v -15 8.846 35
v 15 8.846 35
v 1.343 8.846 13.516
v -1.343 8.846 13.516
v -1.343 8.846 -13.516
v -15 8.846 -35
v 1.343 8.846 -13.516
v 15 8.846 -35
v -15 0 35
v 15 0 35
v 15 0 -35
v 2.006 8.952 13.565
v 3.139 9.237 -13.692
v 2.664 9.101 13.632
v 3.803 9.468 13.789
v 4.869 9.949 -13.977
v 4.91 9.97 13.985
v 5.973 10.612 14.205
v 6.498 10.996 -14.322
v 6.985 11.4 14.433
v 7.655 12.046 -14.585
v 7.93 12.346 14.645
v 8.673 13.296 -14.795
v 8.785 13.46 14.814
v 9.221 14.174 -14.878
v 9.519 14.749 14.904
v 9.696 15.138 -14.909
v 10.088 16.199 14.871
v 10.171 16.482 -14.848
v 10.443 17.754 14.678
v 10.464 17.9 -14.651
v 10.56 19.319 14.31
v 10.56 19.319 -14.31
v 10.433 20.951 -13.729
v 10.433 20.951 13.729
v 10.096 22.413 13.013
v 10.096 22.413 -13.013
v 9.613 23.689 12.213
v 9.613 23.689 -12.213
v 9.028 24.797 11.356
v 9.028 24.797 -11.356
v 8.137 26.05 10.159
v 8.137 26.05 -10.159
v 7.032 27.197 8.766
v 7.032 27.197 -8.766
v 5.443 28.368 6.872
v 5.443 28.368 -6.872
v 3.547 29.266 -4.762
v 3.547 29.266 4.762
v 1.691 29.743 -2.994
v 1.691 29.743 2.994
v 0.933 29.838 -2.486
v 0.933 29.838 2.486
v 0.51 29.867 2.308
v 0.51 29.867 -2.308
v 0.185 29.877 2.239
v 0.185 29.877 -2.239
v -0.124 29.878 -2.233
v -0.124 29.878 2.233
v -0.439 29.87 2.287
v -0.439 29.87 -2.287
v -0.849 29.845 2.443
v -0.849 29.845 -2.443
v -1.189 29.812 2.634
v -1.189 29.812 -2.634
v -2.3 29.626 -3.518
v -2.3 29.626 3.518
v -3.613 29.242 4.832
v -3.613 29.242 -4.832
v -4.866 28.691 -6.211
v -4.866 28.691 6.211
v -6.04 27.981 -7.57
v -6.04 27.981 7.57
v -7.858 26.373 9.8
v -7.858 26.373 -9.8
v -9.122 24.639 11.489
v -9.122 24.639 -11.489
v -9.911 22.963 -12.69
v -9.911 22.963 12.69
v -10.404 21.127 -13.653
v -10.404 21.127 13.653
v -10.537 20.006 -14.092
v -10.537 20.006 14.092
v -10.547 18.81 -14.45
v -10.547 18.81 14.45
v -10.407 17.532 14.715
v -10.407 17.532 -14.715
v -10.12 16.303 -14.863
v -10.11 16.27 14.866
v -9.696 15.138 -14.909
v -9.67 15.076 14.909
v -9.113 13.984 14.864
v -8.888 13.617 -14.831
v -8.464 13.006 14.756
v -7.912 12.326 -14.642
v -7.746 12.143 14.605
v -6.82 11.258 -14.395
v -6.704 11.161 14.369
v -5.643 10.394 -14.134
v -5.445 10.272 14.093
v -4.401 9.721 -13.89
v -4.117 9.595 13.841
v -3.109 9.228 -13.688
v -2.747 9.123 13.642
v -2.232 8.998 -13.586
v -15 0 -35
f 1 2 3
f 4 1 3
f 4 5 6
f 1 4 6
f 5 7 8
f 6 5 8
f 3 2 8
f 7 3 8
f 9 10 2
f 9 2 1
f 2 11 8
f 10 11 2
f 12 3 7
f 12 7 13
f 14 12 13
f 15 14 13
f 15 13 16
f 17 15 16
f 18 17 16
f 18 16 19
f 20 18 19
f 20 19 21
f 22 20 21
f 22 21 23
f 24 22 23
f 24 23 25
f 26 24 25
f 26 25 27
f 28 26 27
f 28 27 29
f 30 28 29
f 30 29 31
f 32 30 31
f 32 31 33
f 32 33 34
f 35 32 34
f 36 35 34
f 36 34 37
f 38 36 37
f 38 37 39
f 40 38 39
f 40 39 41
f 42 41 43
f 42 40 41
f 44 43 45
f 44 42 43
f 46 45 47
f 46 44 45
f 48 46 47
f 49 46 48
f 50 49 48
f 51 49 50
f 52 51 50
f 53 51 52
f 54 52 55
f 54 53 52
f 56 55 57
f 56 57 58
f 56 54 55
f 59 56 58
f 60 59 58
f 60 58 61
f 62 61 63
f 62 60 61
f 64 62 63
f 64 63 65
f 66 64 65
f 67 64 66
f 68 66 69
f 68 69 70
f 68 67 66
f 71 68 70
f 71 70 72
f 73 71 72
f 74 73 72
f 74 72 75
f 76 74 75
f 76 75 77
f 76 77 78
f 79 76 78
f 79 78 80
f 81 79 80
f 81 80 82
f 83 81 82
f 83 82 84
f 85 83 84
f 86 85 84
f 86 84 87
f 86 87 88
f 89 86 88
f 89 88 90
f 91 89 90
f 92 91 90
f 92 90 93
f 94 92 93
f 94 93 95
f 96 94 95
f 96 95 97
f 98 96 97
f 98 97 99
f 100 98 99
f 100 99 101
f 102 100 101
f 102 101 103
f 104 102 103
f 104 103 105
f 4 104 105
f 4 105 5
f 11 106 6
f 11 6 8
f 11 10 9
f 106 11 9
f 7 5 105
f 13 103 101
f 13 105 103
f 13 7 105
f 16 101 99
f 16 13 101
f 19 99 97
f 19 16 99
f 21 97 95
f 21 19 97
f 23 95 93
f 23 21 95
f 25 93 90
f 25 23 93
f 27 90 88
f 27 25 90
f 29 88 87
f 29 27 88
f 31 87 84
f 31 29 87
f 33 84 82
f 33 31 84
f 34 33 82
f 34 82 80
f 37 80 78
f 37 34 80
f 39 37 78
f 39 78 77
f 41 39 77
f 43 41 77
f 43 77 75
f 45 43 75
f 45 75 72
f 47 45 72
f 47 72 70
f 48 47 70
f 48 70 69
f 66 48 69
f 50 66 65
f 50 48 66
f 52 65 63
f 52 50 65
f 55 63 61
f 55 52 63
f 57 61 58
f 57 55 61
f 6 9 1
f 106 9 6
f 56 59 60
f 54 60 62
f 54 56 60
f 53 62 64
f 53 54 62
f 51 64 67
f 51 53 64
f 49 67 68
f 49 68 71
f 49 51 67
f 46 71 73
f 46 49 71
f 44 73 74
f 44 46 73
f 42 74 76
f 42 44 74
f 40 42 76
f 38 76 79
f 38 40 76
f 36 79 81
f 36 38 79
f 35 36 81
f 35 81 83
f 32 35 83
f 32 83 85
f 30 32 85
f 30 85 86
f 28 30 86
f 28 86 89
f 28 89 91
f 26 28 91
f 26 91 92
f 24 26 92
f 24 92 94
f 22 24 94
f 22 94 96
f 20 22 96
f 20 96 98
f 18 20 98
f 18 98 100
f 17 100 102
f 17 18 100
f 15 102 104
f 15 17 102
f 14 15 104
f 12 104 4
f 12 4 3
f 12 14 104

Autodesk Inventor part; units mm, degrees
ref_plane "YZ Plane" through (0, 0, 0) normal (1, 0, 0) x (0, 1, 0)
ref_plane "XZ Plane" through (0, 0, 0) normal (0, 1, 0) x (-1, 0, 0)
ref_plane "XY Plane" through (0, 0, 0) normal (0, 0, 1) x (1, 0, 0)
sketch "Sketch1" plane through (0, 0, 0) normal (0, 1, 0) x (-1, 0, 0)
  line L0 (15, -35) -> (-15, -35)
  line L1 (-15, -35) -> (-15, 35)
  line L2 (-15, 35) -> (15, 35)
  line L3 (15, 35) -> (15, -35)
  line L4 (15, -35) -> (-15, 35) construction
  line L5 (-15, -35) -> (15, 35) construction
  point P0 (0, 0)
  dimension "d0" = 30
  dimension "d1" = 70
extrude "Extrusion1" add sketch "Sketch1" along normal blind 30
sketch "Sketch2" plane through (15, 0, 35) normal (1, 0, 0) x (0, 0, -1)
  circle A0 centre (35, 15.1375) radius 14.909
  line L0 (0, 0) -> (0, 30) projected
  line L1 (0, 8.8455) -> (70, 8.8455)
  line L2 (0, 30) -> (70, 30) projected
  line L3 (0, 0) -> (70, 0) projected
  line L4 (70, 0) -> (70, 30) projected
  point P0 (35, 0)
  point P1 (36.1767, 30)
  point P2 (21.4837, 8.8455)
  point P3 (33.8233, 30)
  point P4 (48.5163, 8.8455)
extrude "Extrusion2" cut sketch "Sketch2" against normal blind 30 contours A0 L2 L4 L1 | A0 L1 L0 L2
sketch "Sketch3" plane through (-15, 0, 35) normal (0, 0, 1) x (1, 0, 0)
  circle A0 centre (15, 19.3194) radius 10.5597
  line L0 (0, 30) -> (0, 8.8455) projected
  line L1 (0, 30) -> (30, 30) projected
  line L2 (30, 8.8455) -> (30, 30) projected
  line L3 (30, 8.8455) -> (0, 8.8455) projected
  point P0 (15, 0)
  point P1 (13.6563, 8.8455)
  point P2 (16.3437, 8.8455)
extrude "Extrusion3" cut sketch "Sketch3" against normal blind 77 contours A0 L3 L0 L1 L2
properties part number "ball transfer unit"
